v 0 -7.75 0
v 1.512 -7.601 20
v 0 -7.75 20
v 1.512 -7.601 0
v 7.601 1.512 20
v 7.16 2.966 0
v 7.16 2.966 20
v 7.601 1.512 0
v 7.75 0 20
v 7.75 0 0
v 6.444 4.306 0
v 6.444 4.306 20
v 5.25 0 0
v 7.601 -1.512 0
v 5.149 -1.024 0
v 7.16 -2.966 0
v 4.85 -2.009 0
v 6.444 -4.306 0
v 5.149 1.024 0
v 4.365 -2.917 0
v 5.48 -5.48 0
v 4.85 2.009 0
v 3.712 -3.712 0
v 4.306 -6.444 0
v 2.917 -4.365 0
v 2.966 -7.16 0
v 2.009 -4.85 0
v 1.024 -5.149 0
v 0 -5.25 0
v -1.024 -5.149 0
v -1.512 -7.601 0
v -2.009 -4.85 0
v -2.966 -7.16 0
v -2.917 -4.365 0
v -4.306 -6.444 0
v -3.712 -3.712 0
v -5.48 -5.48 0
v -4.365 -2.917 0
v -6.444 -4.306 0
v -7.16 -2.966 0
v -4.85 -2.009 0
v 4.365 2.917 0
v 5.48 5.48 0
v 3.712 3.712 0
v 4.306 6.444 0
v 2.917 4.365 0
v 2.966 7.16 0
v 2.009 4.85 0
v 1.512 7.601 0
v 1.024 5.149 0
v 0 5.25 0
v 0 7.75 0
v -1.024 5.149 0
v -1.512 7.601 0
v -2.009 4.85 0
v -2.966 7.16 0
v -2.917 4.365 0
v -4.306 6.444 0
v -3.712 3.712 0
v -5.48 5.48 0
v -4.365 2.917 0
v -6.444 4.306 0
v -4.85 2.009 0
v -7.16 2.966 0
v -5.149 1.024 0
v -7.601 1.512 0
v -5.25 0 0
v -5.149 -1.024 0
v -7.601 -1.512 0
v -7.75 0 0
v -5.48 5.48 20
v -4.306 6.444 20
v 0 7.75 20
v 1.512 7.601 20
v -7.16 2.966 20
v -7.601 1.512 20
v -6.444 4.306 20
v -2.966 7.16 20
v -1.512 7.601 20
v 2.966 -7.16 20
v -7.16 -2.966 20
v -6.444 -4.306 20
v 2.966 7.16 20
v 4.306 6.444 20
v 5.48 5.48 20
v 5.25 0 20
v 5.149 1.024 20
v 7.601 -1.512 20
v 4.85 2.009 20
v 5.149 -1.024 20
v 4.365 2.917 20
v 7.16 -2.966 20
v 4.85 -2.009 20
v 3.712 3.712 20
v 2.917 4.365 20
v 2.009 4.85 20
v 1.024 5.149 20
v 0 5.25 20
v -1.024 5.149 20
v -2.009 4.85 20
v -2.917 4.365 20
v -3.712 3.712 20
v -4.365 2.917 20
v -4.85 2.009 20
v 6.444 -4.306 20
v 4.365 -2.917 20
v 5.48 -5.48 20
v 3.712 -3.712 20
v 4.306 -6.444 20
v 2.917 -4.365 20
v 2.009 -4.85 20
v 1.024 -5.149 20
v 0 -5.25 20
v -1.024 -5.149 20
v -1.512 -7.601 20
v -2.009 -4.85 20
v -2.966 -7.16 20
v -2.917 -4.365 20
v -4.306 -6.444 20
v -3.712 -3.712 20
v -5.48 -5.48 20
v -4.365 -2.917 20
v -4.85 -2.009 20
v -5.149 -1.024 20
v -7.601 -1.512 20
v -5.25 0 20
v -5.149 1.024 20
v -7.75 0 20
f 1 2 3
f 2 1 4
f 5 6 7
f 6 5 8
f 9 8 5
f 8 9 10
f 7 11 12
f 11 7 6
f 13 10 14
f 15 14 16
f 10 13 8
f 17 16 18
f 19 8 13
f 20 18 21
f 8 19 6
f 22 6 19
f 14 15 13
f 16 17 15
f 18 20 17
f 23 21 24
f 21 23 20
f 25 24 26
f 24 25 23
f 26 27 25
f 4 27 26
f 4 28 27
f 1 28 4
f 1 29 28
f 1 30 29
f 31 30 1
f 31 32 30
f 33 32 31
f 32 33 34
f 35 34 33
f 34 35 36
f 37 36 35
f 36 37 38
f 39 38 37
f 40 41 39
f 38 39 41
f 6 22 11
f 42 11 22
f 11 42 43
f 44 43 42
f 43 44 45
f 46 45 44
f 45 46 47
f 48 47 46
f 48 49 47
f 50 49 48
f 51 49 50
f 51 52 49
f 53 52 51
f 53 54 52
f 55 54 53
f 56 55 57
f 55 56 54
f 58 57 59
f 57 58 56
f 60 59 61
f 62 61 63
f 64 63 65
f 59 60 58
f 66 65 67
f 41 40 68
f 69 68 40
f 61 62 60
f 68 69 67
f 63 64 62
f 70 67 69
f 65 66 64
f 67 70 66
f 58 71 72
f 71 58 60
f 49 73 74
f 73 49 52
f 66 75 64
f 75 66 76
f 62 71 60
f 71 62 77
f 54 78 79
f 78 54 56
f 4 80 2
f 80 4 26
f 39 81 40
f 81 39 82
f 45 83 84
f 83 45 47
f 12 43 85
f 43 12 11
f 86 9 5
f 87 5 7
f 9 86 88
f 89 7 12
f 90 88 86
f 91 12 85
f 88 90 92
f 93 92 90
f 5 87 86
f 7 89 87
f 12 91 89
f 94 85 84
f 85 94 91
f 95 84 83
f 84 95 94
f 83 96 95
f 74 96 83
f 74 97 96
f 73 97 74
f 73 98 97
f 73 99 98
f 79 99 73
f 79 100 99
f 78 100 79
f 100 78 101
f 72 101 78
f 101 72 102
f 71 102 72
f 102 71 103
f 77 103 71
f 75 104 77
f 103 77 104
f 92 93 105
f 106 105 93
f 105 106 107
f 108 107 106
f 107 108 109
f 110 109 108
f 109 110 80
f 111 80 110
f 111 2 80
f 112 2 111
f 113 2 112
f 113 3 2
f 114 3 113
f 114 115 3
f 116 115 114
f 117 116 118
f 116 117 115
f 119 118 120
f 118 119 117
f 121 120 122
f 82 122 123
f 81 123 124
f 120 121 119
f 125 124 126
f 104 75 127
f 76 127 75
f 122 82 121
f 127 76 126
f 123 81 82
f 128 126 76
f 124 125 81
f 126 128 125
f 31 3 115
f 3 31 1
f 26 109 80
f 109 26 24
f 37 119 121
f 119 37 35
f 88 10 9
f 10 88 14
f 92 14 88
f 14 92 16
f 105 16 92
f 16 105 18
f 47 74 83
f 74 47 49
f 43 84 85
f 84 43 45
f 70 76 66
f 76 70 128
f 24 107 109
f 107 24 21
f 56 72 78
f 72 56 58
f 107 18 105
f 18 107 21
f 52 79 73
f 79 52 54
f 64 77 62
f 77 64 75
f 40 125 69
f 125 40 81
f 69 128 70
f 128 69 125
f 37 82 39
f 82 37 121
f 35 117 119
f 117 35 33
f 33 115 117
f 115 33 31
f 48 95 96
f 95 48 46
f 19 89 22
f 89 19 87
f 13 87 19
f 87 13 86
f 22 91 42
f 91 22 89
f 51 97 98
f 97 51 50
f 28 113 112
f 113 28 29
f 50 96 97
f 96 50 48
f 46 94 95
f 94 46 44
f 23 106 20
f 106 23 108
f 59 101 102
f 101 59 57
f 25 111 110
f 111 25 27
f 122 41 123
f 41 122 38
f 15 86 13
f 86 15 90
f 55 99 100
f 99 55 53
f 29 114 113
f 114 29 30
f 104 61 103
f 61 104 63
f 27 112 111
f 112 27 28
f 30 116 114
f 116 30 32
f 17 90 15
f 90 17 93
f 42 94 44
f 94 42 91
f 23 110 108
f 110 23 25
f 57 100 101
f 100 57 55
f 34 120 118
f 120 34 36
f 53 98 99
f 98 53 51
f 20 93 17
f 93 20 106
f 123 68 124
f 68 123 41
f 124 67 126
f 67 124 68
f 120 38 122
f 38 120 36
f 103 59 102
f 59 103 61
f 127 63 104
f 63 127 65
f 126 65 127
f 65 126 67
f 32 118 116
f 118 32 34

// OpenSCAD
$fn = 32;

// ----------------------------------------------------------------------
// Spacer sleeve: 15.5 / 10.5 x 20 mm
// ----------------------------------------------------------------------

// --- parameters (mm) ---
sleeve_od = 15.5;         // outside diameter
sleeve_id = 10.5;         // shaft bore
sleeve_l = 20;            // sleeve length
step_d = 14.2;            // reduced diameter
step_l = 7.8;             // length of the step

module sleeve() {
  cylinder(h = sleeve_l, d = sleeve_od);
  translate([0, 0, sleeve_l - step_l]) cylinder(h = step_l, d = step_d);
}

difference() {
  sleeve();
  translate([0, 0, -1]) cylinder(h = sleeve_l + 2, d = sleeve_id);
}
